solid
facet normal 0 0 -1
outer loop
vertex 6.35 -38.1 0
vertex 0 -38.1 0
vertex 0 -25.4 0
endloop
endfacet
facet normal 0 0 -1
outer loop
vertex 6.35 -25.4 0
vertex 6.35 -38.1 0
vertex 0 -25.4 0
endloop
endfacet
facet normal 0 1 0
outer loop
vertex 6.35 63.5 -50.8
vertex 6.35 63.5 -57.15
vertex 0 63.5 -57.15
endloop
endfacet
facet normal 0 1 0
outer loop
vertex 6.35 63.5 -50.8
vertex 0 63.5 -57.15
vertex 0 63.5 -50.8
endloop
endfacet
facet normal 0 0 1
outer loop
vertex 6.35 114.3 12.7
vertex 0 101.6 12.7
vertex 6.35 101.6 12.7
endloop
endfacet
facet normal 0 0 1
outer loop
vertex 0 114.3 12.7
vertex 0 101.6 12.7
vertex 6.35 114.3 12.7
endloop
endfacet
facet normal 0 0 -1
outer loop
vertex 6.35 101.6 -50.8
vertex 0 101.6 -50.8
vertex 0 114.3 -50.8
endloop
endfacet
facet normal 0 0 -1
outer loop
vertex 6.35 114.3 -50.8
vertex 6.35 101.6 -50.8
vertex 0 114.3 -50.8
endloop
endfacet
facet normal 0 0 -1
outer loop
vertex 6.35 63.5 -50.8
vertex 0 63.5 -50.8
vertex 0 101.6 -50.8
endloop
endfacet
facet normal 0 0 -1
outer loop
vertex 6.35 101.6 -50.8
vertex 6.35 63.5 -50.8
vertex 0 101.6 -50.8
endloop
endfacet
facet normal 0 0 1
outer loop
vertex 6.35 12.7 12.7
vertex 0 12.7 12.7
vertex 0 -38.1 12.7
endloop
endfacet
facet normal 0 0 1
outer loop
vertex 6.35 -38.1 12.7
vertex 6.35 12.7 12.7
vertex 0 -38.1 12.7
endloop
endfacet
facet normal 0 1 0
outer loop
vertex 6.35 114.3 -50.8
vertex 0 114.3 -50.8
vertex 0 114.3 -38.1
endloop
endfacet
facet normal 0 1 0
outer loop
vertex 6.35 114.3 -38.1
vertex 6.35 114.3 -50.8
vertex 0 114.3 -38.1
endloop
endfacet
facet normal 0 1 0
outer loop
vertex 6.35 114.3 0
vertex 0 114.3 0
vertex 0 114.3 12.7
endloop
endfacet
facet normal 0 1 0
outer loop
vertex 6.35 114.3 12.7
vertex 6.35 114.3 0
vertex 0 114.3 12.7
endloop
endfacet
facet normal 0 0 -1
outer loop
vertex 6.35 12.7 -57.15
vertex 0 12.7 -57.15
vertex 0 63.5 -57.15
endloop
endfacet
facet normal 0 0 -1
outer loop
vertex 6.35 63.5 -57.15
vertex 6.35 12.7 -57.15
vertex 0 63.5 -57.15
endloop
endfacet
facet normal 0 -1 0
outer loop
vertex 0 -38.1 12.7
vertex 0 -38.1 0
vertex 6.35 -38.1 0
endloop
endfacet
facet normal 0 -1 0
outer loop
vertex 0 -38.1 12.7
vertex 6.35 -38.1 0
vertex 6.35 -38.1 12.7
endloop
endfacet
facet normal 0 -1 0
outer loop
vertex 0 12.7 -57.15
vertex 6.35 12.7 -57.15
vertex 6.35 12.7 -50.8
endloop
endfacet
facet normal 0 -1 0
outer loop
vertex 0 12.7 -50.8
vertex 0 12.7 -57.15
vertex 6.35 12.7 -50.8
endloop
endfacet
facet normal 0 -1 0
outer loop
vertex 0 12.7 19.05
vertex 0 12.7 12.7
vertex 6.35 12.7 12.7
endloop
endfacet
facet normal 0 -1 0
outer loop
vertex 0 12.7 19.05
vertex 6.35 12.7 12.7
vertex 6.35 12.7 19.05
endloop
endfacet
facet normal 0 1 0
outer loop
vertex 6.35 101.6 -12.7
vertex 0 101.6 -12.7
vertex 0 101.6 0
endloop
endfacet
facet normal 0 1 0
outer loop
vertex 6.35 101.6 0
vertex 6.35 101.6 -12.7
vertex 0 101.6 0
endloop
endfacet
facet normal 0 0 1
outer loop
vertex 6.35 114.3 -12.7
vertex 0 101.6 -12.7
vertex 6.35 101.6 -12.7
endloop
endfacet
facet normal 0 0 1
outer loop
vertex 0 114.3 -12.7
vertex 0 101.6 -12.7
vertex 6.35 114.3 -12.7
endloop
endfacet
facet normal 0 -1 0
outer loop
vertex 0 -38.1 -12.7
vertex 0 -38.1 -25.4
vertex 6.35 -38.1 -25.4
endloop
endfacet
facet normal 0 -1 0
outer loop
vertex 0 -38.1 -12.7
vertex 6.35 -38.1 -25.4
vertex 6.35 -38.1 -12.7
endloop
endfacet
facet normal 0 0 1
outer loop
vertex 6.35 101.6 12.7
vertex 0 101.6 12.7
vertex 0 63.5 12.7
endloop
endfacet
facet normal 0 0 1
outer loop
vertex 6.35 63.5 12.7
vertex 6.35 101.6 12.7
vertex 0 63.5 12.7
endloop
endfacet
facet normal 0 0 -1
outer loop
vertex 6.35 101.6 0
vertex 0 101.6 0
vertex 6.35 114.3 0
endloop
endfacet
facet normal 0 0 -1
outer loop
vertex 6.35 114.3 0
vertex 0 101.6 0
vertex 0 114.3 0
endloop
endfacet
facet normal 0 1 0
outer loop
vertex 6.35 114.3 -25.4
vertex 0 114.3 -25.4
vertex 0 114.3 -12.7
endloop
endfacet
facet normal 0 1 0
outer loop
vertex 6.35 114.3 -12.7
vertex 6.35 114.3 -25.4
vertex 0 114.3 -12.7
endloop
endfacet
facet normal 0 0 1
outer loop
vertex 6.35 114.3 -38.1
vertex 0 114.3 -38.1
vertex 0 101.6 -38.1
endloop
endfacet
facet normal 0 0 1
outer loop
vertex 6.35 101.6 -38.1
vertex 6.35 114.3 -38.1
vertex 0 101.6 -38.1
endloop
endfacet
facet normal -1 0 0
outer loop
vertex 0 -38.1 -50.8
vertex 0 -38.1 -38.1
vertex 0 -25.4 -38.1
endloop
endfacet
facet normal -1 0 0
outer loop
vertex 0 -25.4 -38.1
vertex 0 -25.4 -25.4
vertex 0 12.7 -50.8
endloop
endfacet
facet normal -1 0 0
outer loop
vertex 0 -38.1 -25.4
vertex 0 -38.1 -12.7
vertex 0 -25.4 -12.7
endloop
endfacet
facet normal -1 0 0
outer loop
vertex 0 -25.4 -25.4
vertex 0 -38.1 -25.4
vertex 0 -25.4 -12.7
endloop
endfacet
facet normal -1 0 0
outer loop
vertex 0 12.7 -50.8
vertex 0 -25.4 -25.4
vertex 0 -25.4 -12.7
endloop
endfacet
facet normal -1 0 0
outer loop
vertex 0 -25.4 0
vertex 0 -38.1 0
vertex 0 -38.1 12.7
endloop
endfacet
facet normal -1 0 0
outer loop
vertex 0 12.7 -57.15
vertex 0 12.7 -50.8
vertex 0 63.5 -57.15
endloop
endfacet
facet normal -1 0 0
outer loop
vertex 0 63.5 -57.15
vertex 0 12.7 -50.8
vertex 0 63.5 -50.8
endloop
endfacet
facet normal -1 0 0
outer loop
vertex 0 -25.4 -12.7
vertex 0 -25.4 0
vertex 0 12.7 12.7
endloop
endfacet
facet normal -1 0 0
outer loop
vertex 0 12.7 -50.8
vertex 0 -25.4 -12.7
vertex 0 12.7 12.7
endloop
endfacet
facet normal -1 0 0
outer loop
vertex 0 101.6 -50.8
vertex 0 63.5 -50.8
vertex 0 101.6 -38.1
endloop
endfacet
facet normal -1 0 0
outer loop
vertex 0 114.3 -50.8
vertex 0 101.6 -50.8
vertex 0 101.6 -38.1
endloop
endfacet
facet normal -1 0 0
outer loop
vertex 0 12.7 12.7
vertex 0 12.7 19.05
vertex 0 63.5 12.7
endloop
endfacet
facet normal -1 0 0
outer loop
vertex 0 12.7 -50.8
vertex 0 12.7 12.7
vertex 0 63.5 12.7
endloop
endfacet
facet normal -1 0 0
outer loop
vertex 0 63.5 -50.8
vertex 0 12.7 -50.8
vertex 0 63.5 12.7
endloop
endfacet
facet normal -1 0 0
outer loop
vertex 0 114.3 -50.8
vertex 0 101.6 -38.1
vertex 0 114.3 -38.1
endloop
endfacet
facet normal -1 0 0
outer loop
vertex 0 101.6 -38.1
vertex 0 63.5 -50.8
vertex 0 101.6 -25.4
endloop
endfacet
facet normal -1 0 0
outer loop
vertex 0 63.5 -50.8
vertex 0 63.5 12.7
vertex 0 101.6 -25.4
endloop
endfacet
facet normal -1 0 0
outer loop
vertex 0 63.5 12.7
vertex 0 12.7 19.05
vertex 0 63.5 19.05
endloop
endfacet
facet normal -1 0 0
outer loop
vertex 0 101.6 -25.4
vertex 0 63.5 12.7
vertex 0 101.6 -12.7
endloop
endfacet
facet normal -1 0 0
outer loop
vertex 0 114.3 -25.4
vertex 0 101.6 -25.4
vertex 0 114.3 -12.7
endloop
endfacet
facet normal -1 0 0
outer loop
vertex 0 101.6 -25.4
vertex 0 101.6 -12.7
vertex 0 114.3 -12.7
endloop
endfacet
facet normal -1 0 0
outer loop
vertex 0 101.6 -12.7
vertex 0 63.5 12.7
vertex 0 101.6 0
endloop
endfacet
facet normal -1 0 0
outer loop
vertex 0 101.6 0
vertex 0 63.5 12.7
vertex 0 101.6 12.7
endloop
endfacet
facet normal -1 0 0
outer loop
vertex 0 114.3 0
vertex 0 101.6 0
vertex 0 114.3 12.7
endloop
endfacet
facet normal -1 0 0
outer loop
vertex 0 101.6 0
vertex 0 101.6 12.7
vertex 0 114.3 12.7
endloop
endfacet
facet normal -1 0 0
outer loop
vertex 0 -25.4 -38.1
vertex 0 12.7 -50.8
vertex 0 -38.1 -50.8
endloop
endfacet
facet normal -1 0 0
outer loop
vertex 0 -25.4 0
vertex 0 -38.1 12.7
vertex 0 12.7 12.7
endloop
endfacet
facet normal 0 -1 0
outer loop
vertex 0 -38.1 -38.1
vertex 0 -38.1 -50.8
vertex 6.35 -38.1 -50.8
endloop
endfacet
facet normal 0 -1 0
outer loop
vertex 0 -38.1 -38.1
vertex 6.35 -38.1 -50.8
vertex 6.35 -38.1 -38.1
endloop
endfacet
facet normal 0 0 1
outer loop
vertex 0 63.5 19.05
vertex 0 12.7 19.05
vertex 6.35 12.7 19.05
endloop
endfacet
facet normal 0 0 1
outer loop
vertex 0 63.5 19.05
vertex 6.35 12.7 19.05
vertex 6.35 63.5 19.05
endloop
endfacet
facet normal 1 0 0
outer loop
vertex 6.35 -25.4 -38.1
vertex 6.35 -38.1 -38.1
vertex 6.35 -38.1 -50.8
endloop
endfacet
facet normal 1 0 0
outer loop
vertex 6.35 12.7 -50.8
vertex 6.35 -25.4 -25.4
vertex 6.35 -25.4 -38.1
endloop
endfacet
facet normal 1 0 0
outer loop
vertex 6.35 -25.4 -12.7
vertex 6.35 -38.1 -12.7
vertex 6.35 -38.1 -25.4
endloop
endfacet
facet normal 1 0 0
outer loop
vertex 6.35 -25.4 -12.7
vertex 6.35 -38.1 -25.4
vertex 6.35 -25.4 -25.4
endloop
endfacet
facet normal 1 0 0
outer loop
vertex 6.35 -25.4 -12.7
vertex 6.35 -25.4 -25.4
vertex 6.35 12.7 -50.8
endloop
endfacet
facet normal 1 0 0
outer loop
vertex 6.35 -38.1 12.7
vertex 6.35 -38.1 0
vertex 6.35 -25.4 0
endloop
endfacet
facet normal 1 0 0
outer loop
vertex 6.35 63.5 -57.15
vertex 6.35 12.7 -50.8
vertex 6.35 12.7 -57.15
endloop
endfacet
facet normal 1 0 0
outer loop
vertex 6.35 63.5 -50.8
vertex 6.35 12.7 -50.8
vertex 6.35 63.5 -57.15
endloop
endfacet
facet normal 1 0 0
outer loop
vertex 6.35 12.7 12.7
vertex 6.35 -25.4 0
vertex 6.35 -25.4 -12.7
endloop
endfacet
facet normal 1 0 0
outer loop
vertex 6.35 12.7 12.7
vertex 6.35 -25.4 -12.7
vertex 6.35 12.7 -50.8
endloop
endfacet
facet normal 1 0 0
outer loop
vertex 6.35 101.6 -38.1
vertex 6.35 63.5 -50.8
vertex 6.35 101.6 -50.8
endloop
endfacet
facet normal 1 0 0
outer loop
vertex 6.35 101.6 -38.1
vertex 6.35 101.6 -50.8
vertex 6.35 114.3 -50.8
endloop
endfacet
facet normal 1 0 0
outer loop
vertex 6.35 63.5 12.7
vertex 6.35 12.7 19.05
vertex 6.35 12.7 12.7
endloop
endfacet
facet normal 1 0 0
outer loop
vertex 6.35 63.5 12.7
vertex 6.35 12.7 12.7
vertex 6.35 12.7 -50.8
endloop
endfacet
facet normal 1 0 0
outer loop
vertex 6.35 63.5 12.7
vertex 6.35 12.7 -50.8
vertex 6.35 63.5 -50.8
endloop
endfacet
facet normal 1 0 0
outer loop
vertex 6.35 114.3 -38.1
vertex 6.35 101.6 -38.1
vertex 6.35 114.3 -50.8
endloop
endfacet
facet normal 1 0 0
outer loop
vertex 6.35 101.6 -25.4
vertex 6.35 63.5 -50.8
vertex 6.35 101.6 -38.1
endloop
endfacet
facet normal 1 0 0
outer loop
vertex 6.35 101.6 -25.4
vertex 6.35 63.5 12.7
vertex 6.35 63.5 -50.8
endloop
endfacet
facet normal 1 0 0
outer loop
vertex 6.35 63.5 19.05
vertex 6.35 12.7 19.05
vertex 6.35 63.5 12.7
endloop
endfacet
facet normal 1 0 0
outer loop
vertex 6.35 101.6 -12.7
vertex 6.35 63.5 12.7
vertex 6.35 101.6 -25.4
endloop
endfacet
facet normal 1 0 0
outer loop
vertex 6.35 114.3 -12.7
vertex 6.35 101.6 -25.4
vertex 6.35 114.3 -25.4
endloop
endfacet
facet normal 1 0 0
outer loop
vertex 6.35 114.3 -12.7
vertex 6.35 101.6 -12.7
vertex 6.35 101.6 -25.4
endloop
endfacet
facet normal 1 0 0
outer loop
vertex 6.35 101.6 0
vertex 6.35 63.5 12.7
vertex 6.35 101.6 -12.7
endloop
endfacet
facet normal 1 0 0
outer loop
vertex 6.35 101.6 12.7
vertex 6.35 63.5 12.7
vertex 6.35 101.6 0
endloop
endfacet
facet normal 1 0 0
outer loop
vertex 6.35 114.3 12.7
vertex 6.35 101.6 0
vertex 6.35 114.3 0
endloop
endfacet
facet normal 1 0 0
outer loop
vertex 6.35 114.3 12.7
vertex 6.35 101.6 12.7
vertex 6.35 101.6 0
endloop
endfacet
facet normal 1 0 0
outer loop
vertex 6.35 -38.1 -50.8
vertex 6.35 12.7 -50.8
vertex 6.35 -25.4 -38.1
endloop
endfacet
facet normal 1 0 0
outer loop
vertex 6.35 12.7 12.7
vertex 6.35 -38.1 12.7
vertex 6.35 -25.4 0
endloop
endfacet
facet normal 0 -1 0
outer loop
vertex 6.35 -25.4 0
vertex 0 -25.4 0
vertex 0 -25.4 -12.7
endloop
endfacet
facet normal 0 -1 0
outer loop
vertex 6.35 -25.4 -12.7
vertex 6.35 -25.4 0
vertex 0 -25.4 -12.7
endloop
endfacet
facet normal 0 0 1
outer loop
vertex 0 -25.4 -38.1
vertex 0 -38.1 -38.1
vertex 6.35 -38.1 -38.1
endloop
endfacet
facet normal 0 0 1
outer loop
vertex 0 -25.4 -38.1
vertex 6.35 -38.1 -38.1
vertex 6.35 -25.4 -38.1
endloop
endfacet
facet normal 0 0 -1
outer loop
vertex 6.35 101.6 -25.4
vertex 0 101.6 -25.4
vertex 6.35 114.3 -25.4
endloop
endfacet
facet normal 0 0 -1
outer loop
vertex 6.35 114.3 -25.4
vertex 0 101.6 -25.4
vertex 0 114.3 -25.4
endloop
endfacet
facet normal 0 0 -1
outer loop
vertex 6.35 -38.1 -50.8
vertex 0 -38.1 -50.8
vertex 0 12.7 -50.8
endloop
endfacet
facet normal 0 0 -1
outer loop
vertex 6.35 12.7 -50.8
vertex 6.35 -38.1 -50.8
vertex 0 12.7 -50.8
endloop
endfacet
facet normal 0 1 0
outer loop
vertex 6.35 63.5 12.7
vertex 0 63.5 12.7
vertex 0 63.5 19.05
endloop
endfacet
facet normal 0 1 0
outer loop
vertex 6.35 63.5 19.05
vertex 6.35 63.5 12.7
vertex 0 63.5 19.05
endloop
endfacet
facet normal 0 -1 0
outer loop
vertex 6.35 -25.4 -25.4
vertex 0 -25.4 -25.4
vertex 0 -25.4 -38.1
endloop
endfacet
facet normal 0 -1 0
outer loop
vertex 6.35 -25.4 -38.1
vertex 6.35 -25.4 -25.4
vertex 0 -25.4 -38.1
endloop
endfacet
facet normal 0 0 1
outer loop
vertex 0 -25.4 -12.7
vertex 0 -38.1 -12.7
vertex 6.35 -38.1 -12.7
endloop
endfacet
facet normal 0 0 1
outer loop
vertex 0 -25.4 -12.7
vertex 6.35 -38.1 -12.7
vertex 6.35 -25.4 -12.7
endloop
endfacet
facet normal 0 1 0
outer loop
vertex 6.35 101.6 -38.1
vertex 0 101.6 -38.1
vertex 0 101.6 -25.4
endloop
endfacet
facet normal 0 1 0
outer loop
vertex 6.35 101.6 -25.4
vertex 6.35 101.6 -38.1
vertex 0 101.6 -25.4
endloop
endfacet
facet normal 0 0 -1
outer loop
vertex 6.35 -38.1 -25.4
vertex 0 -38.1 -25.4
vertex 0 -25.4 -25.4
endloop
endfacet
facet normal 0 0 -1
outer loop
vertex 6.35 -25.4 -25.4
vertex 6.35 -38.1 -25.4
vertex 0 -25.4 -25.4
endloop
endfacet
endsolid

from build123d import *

# Parameters (mm, degrees)
F0_W     = 12.7
F0_H     = 12.7
F0_W_2   = 50.8
F0_H_2   = 6.35
F1_DEPTH = 6.35


# Not quite as in the source:
# - ends of sketch curves that miss each other by under 0.0002 mm in the source are joined


with BuildPart() as f1:
    # F0 (on Right) → F1 (new body)
    with BuildSketch(Plane.YZ):
        with Locations((-31.75, 6.35)):
            Rectangle(F0_W, F0_H)
        Polygon((12.7, 12.7), (-25.4, 12.7), (-25.4, 0), (-25.4, -12.7), (-25.4, -25.4), (-25.4, -38.1), (-25.4, -50.8), (12.7, -50.8), (63.5, -50.8), (101.6, -50.8), (101.6, -38.0999993861), (101.6, -25.3999993861), (101.6, -12.6999993861), (101.6, 6.139e-07), (101.6, 12.7), (63.5, 12.7), align=None)
        with Locations((-31.75, -19.05)):
            Rectangle(F0_W, F0_H)
        with Locations((-31.75, -44.45)):
            Rectangle(F0_W, F0_H)
        with Locations((38.1, -53.975)):
            Rectangle(F0_W_2, F0_H_2)
        with Locations((38.1, 15.875)):
            Rectangle(F0_W_2, F0_H_2)
        with Locations((107.95, 6.3500006139)):
            Rectangle(F0_W, F0_H)
        with Locations((107.95, -19.0499993861)):
            Rectangle(F0_W, F0_H)
        Polygon((114.3, -38.0999993861), (101.6, -38.0999993861), (101.6, -50.8), (114.3, -50.7999993861), align=None)
    extrude(amount=F1_DEPTH)


solid = f1.part
